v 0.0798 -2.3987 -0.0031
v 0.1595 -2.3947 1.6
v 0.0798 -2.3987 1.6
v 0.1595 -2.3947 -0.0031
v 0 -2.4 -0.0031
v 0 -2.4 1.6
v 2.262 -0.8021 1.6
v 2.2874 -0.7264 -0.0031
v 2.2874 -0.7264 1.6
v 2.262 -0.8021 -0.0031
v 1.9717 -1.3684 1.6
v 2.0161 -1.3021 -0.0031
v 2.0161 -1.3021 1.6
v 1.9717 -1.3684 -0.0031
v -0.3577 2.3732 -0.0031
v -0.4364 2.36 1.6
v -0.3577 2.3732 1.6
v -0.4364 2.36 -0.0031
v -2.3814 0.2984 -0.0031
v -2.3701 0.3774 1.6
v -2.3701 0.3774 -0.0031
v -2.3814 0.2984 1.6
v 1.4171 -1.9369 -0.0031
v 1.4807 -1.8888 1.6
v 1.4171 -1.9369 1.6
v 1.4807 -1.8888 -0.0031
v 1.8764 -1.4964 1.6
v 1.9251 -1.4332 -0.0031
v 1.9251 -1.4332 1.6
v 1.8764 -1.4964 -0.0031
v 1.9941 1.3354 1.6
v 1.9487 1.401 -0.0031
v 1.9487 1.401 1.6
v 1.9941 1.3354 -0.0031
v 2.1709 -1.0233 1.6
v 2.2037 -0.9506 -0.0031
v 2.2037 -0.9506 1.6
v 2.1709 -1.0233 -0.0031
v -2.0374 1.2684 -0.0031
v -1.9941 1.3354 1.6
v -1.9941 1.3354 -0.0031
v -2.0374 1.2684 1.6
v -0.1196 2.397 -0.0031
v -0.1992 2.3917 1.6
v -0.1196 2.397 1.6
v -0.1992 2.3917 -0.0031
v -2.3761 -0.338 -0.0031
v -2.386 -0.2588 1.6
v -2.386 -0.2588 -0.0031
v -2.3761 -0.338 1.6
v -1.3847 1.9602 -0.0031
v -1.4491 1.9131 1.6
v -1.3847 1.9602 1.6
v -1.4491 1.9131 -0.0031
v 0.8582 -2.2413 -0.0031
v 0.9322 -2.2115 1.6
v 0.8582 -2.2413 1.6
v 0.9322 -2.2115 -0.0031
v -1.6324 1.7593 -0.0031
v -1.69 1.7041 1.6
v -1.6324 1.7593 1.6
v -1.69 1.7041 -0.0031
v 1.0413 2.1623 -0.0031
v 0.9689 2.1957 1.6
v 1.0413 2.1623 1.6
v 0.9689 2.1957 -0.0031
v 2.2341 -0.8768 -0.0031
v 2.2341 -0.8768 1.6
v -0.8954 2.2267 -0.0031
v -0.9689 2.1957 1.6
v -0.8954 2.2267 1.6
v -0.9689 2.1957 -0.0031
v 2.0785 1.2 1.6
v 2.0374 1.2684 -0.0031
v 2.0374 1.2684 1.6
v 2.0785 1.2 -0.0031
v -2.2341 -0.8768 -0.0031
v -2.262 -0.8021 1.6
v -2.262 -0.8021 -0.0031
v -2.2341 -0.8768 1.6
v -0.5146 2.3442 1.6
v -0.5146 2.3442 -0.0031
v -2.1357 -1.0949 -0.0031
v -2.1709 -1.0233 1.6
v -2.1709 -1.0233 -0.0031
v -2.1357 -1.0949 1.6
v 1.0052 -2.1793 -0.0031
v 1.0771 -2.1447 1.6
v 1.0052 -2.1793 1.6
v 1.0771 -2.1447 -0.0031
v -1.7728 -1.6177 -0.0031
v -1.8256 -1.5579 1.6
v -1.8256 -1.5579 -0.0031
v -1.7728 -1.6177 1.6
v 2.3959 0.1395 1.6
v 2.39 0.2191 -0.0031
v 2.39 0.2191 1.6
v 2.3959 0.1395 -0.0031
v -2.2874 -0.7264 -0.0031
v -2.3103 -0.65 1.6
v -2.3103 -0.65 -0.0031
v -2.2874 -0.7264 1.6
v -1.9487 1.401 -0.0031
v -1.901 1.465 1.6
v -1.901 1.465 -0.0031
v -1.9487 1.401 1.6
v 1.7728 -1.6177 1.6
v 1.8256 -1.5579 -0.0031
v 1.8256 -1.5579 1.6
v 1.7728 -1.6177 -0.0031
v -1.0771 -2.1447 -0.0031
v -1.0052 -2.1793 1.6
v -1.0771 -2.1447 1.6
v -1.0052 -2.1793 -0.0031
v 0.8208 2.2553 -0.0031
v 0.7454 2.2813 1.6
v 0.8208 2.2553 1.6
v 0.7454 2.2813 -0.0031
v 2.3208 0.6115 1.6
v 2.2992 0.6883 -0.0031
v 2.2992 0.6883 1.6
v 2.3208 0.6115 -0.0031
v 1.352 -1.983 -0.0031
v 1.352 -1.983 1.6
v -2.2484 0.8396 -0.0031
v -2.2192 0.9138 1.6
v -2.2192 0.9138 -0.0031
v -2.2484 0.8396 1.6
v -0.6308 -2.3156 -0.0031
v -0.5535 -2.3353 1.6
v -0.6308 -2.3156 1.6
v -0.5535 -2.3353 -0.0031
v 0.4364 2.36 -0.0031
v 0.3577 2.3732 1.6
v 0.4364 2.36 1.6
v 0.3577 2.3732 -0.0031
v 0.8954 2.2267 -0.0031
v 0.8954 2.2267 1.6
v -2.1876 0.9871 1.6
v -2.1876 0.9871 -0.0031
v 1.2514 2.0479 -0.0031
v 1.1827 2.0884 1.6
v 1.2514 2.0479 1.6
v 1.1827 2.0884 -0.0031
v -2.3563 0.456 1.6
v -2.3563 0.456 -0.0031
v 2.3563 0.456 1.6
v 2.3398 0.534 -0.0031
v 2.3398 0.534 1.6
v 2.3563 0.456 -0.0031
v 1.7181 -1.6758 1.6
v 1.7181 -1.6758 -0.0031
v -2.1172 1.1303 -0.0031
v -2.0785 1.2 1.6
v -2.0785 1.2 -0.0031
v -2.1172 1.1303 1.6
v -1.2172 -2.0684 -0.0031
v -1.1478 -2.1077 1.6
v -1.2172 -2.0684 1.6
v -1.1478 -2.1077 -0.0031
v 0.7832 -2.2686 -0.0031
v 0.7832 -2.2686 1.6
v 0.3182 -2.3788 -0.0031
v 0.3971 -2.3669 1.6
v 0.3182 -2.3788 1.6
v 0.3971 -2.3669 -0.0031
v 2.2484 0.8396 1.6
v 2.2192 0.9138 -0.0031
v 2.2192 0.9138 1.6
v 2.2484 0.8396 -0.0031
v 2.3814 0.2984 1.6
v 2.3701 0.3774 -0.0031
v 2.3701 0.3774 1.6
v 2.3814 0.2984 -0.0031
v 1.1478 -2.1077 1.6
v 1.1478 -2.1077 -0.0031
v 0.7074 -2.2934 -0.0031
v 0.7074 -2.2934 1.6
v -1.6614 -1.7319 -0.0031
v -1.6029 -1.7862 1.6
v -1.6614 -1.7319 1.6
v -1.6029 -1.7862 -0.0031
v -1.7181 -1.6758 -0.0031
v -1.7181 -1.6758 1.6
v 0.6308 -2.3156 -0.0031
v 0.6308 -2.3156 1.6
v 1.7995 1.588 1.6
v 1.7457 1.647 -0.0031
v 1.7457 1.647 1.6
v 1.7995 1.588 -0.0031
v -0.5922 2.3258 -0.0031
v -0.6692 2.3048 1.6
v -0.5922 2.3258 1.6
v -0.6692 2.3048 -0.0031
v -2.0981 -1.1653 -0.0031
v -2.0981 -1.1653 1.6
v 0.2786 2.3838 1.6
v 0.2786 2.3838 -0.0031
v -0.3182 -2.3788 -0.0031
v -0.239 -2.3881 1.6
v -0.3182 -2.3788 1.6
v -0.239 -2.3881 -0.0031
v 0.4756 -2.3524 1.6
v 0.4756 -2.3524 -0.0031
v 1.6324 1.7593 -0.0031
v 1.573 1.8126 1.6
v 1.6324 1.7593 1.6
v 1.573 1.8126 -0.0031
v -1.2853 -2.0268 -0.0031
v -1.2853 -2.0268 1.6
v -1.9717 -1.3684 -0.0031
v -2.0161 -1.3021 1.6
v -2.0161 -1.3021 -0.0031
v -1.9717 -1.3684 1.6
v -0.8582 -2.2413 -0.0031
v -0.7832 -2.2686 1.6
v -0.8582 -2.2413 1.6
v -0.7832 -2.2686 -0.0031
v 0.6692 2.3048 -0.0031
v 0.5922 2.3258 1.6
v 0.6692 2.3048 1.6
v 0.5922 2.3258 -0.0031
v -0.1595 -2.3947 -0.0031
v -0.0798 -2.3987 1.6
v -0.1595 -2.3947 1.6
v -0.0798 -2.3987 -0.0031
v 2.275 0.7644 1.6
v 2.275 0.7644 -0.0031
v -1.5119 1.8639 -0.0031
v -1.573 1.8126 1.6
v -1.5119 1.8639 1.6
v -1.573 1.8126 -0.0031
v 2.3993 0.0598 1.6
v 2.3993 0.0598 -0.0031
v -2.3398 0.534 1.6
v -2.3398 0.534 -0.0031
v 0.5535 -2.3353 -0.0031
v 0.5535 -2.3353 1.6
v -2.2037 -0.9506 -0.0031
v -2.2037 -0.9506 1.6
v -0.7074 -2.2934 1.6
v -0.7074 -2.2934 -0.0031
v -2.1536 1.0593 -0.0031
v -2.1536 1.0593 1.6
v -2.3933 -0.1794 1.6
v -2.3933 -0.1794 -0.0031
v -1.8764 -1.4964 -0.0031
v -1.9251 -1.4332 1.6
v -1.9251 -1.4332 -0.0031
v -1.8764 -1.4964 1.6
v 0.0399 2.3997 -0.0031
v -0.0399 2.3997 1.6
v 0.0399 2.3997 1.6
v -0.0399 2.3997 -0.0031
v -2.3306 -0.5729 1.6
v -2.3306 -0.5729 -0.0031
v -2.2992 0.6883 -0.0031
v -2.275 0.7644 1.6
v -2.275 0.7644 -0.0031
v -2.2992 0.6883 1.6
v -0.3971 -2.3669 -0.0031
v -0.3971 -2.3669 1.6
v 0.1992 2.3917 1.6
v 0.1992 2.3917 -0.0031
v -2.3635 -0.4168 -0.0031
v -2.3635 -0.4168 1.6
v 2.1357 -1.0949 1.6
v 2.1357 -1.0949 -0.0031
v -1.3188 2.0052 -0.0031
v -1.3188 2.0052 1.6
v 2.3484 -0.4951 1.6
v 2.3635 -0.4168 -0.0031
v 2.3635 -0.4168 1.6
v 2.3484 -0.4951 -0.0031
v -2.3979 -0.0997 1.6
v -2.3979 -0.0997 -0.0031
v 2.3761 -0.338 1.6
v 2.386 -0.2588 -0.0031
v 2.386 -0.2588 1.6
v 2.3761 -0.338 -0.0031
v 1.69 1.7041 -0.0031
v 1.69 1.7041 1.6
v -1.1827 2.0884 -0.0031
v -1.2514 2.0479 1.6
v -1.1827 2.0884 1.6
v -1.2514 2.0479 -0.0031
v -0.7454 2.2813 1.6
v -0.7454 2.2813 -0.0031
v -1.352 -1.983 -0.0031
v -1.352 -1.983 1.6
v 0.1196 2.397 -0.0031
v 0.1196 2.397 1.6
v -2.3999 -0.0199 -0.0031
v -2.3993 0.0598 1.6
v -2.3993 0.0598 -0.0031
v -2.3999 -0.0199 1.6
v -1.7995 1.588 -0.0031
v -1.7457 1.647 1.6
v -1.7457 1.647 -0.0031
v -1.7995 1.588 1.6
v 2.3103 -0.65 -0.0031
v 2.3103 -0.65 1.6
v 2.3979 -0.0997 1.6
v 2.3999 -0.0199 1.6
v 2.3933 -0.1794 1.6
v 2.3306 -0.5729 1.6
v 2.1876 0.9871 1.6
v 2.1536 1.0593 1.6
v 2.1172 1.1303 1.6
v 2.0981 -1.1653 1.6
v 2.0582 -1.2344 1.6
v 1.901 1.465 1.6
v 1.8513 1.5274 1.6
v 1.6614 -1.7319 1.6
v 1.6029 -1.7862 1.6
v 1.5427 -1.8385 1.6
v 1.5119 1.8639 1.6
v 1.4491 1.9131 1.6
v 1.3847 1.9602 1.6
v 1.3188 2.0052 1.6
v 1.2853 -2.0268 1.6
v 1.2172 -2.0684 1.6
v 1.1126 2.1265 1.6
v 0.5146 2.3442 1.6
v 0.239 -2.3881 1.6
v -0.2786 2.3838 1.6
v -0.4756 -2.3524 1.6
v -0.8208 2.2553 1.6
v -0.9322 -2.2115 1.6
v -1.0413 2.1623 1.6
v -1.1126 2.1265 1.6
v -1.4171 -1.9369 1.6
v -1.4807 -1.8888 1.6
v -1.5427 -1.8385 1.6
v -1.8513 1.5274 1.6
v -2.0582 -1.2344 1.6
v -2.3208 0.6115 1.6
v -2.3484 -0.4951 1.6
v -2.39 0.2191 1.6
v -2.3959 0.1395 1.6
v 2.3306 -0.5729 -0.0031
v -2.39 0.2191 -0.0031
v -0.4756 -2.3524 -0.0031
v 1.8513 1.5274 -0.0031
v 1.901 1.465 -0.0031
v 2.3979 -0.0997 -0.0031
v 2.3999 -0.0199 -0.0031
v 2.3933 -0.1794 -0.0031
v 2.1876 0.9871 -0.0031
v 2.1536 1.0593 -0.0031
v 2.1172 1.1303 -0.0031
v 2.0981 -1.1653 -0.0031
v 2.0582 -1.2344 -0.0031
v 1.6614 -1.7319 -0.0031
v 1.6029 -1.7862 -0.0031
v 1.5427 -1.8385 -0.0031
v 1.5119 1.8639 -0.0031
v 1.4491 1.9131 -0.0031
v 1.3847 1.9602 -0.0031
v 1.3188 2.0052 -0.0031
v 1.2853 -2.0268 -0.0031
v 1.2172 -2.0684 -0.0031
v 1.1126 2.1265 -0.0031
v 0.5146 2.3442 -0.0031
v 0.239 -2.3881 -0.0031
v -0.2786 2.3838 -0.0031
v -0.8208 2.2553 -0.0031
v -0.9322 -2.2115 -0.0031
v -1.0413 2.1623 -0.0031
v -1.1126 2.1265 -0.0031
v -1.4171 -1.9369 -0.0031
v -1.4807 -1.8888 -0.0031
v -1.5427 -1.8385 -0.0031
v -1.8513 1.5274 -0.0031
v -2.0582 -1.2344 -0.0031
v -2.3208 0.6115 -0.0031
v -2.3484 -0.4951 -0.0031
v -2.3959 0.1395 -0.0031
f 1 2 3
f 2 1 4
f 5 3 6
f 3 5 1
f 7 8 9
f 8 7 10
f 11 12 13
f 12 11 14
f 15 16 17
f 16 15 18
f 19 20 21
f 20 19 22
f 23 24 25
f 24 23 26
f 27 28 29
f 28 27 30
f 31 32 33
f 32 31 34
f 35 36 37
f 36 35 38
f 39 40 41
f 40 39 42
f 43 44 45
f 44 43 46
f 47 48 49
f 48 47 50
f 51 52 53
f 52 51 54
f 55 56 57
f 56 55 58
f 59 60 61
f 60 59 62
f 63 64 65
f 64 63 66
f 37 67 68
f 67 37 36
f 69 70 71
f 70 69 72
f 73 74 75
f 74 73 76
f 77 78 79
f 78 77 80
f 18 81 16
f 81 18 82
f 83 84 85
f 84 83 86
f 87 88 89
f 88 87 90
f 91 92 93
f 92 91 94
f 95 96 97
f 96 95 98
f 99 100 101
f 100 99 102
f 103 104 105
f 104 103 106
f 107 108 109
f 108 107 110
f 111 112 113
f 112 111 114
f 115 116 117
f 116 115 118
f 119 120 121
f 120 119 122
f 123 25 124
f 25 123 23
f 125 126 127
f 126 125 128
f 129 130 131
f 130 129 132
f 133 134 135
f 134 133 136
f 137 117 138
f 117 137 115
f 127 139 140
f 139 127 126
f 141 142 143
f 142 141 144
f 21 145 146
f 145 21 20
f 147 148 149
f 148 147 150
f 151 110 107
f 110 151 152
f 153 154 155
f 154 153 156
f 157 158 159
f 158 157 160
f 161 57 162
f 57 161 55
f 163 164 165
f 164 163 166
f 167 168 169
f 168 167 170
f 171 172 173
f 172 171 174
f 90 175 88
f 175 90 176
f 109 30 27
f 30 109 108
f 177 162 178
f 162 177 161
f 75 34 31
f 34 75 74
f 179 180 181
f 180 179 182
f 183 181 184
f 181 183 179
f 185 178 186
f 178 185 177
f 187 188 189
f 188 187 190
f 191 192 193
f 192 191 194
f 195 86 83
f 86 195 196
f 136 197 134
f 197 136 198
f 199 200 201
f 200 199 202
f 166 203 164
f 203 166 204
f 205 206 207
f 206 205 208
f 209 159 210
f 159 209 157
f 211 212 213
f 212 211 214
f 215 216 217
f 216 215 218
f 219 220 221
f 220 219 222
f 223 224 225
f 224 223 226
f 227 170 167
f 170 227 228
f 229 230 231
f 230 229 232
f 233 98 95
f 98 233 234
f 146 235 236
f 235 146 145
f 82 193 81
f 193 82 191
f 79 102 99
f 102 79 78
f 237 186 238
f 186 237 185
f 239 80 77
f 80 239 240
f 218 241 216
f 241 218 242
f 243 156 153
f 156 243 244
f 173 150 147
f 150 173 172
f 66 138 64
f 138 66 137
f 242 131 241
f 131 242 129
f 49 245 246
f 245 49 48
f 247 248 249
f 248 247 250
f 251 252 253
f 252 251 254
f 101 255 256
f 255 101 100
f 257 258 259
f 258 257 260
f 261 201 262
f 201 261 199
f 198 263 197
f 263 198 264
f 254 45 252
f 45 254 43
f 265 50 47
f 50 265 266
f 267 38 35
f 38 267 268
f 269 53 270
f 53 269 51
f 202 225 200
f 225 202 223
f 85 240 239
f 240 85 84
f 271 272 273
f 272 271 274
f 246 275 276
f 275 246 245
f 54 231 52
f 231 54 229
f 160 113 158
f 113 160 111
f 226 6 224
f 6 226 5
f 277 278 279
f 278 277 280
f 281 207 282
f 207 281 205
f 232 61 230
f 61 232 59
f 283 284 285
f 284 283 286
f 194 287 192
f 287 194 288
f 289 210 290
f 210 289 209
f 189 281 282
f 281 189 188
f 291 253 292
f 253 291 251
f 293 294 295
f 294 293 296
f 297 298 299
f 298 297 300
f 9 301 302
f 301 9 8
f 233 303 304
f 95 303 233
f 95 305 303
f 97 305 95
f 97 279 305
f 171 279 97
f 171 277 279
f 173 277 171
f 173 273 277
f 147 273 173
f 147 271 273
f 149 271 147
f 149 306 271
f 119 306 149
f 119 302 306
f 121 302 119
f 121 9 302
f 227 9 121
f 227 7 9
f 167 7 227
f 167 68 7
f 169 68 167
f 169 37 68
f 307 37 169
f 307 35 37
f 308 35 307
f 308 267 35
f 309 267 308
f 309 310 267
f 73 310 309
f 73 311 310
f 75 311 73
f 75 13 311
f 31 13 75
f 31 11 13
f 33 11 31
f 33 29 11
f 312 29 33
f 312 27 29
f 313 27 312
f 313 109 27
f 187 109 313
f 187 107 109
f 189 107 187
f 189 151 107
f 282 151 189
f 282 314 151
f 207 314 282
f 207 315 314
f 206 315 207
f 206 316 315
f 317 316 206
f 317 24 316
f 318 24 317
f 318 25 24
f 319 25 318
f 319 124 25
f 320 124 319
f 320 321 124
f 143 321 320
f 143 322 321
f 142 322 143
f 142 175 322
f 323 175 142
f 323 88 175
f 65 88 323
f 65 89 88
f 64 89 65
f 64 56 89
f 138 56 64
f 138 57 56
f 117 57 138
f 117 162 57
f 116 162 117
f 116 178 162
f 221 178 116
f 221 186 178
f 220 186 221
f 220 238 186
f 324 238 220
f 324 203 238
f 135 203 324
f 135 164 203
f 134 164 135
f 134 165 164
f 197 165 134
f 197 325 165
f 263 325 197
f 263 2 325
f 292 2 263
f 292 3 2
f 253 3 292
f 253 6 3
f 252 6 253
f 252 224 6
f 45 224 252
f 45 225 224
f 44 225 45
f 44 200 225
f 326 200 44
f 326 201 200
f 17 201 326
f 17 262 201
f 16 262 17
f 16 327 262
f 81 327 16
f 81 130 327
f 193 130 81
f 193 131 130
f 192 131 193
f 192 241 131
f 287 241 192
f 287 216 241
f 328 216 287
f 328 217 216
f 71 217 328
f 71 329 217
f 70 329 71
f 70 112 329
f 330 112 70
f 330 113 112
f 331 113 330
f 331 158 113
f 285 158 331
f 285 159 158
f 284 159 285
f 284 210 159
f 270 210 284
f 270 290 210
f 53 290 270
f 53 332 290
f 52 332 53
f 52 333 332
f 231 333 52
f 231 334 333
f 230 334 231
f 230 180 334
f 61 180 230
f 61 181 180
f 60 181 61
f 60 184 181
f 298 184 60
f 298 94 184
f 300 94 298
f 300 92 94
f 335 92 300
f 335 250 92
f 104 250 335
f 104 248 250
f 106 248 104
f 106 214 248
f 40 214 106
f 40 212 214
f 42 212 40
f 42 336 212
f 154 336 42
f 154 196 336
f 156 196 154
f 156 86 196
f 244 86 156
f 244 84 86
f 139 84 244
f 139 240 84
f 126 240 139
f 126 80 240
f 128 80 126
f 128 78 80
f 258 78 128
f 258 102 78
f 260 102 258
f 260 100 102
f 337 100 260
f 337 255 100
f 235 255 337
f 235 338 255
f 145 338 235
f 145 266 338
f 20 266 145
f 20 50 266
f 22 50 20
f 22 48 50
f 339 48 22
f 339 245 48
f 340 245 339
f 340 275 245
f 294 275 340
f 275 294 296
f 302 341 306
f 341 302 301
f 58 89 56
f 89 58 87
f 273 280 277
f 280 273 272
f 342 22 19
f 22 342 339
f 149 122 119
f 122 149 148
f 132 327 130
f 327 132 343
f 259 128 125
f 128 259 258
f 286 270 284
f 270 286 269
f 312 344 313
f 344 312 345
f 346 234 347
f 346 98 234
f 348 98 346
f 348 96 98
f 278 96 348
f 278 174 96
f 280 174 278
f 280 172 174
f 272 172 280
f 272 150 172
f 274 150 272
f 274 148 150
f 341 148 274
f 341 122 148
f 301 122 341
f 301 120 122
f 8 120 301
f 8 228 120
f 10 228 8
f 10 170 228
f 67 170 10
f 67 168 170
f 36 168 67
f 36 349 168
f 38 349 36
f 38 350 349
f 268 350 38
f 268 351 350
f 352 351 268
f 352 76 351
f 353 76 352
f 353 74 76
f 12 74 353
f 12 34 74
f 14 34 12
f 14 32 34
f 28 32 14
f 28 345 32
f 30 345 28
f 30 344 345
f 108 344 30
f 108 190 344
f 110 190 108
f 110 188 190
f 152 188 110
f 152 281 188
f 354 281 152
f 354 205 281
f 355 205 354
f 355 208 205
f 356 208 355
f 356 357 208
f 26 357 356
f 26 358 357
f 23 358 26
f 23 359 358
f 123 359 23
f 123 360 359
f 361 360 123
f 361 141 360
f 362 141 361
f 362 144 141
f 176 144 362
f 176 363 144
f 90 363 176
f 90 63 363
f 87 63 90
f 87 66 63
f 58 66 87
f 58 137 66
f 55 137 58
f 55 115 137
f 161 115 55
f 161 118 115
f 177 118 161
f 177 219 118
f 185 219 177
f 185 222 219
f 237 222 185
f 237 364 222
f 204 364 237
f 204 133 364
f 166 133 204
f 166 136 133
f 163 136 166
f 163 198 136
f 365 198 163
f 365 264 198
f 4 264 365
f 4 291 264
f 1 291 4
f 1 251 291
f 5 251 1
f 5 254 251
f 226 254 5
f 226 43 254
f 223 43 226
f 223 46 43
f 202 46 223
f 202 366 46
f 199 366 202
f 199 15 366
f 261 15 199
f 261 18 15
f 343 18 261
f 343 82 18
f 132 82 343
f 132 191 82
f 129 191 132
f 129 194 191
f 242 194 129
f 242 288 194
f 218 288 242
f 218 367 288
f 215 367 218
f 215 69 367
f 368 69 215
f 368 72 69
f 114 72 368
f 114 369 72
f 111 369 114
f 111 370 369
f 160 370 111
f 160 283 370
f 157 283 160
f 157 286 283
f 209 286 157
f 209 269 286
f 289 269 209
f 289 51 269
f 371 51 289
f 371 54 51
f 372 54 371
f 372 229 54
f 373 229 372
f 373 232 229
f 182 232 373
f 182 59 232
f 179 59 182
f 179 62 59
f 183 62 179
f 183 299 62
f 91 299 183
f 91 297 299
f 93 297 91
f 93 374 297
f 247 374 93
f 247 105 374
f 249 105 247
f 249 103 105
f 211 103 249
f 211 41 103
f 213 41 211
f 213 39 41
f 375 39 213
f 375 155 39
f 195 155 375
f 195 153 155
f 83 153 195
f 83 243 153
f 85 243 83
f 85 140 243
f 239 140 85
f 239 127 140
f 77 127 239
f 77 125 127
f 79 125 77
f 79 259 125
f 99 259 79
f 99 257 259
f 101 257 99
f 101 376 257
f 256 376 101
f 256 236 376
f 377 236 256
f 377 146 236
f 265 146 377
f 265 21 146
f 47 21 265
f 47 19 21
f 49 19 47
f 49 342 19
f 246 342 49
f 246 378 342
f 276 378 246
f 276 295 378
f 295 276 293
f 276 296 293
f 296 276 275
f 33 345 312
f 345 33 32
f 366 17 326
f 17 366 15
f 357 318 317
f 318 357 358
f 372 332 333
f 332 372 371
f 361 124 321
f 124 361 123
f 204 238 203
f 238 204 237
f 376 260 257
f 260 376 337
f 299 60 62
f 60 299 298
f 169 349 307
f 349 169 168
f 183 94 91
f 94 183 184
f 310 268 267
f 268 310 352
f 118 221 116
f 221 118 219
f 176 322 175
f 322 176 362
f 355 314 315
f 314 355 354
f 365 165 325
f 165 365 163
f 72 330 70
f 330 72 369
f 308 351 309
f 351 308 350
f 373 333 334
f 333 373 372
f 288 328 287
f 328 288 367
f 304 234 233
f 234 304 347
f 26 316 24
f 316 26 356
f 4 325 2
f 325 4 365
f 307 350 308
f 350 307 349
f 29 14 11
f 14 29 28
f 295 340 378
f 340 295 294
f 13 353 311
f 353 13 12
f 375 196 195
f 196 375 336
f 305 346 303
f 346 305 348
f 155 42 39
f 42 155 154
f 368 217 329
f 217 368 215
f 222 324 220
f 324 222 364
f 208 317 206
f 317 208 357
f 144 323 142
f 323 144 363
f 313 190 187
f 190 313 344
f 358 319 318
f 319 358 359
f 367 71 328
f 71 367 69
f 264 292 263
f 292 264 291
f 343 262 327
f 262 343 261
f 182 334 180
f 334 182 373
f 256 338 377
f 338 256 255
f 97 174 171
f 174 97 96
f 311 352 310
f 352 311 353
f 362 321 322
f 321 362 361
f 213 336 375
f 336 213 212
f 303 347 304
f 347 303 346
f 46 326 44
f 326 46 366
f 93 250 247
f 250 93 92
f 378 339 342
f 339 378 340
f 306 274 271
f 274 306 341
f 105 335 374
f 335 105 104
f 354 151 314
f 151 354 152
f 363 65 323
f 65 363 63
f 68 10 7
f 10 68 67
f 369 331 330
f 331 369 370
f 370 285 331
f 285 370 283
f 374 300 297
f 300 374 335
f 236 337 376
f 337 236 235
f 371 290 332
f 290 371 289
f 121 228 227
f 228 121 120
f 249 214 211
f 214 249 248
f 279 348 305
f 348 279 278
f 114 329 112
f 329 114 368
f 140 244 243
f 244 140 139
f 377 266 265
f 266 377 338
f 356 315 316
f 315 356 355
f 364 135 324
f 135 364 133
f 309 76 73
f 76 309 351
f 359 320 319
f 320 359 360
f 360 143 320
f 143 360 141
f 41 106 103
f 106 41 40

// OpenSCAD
use <../lib.scad>
use <s/3191s01.scad>
use <../p/stud.scad>
$fa=1; $fs=0.2;
function ldraw_lib__3190(realsolid=false) = [
// 0 Door  1 x  3 x  3 Right with Vertical Handle with Grip
// 0 Name: 3190.dat
// 0 Author: James Jessiman
// 0 !LDRAW_ORG Part UPDATE 2020-01
// 0 !LICENSE Licensed under CC BY 2.0 and CC BY 4.0 : see CAreadme.txt
// 
// 0 BFC CERTIFY CCW
  [0,"BFC","CERTIFY"],
  [0,"BFC","CCW"],
// 
// 0 !HISTORY 1998-06-20 [PTadmin] Official Update 1998-06
// 0 !HISTORY 2007-06-24 [PTadmin] Header formatted for Contributor Agreement
// 0 !HISTORY 2008-07-01 [PTadmin] Official Update 2008-01
// 0 !HISTORY 2010-02-15 [PTadmin] Renamed from 3192
// 0 !HISTORY 2010-02-16 [Steffen] used subpart
// 0 !HISTORY 2010-07-05 [PTadmin] Official Update 2010-02
// 0 !HISTORY 2020-06-28 [PTadmin] Official Update 2020-01
// 
// 
// 1 16 0 0 0 -1 0 0 0 1 0 0 0 1 s\3191s01.dat
  [1,16,0,0,0,-1,0,0,0,1,0,0,0,1, ldraw_lib__s__3191s01(realsolid)],
// 1 16 0 0 0 1 0 0 0 1 0 0 0 1 stud.dat
  [1,16,0,0,0,1,0,0,0,1,0,0,0,1, ldraw_lib__stud(realsolid)],
];
module ldraw_lib__3190(step=0, col=false, unit=2/5, alt=false, line=0.2, solid=!$preview)
    makepoly(ldraw_lib__3190(solid), step=step, col=col, unit=unit, alt=alt, line=line, solid=solid);
ldraw_lib__3190(line=0.2);
